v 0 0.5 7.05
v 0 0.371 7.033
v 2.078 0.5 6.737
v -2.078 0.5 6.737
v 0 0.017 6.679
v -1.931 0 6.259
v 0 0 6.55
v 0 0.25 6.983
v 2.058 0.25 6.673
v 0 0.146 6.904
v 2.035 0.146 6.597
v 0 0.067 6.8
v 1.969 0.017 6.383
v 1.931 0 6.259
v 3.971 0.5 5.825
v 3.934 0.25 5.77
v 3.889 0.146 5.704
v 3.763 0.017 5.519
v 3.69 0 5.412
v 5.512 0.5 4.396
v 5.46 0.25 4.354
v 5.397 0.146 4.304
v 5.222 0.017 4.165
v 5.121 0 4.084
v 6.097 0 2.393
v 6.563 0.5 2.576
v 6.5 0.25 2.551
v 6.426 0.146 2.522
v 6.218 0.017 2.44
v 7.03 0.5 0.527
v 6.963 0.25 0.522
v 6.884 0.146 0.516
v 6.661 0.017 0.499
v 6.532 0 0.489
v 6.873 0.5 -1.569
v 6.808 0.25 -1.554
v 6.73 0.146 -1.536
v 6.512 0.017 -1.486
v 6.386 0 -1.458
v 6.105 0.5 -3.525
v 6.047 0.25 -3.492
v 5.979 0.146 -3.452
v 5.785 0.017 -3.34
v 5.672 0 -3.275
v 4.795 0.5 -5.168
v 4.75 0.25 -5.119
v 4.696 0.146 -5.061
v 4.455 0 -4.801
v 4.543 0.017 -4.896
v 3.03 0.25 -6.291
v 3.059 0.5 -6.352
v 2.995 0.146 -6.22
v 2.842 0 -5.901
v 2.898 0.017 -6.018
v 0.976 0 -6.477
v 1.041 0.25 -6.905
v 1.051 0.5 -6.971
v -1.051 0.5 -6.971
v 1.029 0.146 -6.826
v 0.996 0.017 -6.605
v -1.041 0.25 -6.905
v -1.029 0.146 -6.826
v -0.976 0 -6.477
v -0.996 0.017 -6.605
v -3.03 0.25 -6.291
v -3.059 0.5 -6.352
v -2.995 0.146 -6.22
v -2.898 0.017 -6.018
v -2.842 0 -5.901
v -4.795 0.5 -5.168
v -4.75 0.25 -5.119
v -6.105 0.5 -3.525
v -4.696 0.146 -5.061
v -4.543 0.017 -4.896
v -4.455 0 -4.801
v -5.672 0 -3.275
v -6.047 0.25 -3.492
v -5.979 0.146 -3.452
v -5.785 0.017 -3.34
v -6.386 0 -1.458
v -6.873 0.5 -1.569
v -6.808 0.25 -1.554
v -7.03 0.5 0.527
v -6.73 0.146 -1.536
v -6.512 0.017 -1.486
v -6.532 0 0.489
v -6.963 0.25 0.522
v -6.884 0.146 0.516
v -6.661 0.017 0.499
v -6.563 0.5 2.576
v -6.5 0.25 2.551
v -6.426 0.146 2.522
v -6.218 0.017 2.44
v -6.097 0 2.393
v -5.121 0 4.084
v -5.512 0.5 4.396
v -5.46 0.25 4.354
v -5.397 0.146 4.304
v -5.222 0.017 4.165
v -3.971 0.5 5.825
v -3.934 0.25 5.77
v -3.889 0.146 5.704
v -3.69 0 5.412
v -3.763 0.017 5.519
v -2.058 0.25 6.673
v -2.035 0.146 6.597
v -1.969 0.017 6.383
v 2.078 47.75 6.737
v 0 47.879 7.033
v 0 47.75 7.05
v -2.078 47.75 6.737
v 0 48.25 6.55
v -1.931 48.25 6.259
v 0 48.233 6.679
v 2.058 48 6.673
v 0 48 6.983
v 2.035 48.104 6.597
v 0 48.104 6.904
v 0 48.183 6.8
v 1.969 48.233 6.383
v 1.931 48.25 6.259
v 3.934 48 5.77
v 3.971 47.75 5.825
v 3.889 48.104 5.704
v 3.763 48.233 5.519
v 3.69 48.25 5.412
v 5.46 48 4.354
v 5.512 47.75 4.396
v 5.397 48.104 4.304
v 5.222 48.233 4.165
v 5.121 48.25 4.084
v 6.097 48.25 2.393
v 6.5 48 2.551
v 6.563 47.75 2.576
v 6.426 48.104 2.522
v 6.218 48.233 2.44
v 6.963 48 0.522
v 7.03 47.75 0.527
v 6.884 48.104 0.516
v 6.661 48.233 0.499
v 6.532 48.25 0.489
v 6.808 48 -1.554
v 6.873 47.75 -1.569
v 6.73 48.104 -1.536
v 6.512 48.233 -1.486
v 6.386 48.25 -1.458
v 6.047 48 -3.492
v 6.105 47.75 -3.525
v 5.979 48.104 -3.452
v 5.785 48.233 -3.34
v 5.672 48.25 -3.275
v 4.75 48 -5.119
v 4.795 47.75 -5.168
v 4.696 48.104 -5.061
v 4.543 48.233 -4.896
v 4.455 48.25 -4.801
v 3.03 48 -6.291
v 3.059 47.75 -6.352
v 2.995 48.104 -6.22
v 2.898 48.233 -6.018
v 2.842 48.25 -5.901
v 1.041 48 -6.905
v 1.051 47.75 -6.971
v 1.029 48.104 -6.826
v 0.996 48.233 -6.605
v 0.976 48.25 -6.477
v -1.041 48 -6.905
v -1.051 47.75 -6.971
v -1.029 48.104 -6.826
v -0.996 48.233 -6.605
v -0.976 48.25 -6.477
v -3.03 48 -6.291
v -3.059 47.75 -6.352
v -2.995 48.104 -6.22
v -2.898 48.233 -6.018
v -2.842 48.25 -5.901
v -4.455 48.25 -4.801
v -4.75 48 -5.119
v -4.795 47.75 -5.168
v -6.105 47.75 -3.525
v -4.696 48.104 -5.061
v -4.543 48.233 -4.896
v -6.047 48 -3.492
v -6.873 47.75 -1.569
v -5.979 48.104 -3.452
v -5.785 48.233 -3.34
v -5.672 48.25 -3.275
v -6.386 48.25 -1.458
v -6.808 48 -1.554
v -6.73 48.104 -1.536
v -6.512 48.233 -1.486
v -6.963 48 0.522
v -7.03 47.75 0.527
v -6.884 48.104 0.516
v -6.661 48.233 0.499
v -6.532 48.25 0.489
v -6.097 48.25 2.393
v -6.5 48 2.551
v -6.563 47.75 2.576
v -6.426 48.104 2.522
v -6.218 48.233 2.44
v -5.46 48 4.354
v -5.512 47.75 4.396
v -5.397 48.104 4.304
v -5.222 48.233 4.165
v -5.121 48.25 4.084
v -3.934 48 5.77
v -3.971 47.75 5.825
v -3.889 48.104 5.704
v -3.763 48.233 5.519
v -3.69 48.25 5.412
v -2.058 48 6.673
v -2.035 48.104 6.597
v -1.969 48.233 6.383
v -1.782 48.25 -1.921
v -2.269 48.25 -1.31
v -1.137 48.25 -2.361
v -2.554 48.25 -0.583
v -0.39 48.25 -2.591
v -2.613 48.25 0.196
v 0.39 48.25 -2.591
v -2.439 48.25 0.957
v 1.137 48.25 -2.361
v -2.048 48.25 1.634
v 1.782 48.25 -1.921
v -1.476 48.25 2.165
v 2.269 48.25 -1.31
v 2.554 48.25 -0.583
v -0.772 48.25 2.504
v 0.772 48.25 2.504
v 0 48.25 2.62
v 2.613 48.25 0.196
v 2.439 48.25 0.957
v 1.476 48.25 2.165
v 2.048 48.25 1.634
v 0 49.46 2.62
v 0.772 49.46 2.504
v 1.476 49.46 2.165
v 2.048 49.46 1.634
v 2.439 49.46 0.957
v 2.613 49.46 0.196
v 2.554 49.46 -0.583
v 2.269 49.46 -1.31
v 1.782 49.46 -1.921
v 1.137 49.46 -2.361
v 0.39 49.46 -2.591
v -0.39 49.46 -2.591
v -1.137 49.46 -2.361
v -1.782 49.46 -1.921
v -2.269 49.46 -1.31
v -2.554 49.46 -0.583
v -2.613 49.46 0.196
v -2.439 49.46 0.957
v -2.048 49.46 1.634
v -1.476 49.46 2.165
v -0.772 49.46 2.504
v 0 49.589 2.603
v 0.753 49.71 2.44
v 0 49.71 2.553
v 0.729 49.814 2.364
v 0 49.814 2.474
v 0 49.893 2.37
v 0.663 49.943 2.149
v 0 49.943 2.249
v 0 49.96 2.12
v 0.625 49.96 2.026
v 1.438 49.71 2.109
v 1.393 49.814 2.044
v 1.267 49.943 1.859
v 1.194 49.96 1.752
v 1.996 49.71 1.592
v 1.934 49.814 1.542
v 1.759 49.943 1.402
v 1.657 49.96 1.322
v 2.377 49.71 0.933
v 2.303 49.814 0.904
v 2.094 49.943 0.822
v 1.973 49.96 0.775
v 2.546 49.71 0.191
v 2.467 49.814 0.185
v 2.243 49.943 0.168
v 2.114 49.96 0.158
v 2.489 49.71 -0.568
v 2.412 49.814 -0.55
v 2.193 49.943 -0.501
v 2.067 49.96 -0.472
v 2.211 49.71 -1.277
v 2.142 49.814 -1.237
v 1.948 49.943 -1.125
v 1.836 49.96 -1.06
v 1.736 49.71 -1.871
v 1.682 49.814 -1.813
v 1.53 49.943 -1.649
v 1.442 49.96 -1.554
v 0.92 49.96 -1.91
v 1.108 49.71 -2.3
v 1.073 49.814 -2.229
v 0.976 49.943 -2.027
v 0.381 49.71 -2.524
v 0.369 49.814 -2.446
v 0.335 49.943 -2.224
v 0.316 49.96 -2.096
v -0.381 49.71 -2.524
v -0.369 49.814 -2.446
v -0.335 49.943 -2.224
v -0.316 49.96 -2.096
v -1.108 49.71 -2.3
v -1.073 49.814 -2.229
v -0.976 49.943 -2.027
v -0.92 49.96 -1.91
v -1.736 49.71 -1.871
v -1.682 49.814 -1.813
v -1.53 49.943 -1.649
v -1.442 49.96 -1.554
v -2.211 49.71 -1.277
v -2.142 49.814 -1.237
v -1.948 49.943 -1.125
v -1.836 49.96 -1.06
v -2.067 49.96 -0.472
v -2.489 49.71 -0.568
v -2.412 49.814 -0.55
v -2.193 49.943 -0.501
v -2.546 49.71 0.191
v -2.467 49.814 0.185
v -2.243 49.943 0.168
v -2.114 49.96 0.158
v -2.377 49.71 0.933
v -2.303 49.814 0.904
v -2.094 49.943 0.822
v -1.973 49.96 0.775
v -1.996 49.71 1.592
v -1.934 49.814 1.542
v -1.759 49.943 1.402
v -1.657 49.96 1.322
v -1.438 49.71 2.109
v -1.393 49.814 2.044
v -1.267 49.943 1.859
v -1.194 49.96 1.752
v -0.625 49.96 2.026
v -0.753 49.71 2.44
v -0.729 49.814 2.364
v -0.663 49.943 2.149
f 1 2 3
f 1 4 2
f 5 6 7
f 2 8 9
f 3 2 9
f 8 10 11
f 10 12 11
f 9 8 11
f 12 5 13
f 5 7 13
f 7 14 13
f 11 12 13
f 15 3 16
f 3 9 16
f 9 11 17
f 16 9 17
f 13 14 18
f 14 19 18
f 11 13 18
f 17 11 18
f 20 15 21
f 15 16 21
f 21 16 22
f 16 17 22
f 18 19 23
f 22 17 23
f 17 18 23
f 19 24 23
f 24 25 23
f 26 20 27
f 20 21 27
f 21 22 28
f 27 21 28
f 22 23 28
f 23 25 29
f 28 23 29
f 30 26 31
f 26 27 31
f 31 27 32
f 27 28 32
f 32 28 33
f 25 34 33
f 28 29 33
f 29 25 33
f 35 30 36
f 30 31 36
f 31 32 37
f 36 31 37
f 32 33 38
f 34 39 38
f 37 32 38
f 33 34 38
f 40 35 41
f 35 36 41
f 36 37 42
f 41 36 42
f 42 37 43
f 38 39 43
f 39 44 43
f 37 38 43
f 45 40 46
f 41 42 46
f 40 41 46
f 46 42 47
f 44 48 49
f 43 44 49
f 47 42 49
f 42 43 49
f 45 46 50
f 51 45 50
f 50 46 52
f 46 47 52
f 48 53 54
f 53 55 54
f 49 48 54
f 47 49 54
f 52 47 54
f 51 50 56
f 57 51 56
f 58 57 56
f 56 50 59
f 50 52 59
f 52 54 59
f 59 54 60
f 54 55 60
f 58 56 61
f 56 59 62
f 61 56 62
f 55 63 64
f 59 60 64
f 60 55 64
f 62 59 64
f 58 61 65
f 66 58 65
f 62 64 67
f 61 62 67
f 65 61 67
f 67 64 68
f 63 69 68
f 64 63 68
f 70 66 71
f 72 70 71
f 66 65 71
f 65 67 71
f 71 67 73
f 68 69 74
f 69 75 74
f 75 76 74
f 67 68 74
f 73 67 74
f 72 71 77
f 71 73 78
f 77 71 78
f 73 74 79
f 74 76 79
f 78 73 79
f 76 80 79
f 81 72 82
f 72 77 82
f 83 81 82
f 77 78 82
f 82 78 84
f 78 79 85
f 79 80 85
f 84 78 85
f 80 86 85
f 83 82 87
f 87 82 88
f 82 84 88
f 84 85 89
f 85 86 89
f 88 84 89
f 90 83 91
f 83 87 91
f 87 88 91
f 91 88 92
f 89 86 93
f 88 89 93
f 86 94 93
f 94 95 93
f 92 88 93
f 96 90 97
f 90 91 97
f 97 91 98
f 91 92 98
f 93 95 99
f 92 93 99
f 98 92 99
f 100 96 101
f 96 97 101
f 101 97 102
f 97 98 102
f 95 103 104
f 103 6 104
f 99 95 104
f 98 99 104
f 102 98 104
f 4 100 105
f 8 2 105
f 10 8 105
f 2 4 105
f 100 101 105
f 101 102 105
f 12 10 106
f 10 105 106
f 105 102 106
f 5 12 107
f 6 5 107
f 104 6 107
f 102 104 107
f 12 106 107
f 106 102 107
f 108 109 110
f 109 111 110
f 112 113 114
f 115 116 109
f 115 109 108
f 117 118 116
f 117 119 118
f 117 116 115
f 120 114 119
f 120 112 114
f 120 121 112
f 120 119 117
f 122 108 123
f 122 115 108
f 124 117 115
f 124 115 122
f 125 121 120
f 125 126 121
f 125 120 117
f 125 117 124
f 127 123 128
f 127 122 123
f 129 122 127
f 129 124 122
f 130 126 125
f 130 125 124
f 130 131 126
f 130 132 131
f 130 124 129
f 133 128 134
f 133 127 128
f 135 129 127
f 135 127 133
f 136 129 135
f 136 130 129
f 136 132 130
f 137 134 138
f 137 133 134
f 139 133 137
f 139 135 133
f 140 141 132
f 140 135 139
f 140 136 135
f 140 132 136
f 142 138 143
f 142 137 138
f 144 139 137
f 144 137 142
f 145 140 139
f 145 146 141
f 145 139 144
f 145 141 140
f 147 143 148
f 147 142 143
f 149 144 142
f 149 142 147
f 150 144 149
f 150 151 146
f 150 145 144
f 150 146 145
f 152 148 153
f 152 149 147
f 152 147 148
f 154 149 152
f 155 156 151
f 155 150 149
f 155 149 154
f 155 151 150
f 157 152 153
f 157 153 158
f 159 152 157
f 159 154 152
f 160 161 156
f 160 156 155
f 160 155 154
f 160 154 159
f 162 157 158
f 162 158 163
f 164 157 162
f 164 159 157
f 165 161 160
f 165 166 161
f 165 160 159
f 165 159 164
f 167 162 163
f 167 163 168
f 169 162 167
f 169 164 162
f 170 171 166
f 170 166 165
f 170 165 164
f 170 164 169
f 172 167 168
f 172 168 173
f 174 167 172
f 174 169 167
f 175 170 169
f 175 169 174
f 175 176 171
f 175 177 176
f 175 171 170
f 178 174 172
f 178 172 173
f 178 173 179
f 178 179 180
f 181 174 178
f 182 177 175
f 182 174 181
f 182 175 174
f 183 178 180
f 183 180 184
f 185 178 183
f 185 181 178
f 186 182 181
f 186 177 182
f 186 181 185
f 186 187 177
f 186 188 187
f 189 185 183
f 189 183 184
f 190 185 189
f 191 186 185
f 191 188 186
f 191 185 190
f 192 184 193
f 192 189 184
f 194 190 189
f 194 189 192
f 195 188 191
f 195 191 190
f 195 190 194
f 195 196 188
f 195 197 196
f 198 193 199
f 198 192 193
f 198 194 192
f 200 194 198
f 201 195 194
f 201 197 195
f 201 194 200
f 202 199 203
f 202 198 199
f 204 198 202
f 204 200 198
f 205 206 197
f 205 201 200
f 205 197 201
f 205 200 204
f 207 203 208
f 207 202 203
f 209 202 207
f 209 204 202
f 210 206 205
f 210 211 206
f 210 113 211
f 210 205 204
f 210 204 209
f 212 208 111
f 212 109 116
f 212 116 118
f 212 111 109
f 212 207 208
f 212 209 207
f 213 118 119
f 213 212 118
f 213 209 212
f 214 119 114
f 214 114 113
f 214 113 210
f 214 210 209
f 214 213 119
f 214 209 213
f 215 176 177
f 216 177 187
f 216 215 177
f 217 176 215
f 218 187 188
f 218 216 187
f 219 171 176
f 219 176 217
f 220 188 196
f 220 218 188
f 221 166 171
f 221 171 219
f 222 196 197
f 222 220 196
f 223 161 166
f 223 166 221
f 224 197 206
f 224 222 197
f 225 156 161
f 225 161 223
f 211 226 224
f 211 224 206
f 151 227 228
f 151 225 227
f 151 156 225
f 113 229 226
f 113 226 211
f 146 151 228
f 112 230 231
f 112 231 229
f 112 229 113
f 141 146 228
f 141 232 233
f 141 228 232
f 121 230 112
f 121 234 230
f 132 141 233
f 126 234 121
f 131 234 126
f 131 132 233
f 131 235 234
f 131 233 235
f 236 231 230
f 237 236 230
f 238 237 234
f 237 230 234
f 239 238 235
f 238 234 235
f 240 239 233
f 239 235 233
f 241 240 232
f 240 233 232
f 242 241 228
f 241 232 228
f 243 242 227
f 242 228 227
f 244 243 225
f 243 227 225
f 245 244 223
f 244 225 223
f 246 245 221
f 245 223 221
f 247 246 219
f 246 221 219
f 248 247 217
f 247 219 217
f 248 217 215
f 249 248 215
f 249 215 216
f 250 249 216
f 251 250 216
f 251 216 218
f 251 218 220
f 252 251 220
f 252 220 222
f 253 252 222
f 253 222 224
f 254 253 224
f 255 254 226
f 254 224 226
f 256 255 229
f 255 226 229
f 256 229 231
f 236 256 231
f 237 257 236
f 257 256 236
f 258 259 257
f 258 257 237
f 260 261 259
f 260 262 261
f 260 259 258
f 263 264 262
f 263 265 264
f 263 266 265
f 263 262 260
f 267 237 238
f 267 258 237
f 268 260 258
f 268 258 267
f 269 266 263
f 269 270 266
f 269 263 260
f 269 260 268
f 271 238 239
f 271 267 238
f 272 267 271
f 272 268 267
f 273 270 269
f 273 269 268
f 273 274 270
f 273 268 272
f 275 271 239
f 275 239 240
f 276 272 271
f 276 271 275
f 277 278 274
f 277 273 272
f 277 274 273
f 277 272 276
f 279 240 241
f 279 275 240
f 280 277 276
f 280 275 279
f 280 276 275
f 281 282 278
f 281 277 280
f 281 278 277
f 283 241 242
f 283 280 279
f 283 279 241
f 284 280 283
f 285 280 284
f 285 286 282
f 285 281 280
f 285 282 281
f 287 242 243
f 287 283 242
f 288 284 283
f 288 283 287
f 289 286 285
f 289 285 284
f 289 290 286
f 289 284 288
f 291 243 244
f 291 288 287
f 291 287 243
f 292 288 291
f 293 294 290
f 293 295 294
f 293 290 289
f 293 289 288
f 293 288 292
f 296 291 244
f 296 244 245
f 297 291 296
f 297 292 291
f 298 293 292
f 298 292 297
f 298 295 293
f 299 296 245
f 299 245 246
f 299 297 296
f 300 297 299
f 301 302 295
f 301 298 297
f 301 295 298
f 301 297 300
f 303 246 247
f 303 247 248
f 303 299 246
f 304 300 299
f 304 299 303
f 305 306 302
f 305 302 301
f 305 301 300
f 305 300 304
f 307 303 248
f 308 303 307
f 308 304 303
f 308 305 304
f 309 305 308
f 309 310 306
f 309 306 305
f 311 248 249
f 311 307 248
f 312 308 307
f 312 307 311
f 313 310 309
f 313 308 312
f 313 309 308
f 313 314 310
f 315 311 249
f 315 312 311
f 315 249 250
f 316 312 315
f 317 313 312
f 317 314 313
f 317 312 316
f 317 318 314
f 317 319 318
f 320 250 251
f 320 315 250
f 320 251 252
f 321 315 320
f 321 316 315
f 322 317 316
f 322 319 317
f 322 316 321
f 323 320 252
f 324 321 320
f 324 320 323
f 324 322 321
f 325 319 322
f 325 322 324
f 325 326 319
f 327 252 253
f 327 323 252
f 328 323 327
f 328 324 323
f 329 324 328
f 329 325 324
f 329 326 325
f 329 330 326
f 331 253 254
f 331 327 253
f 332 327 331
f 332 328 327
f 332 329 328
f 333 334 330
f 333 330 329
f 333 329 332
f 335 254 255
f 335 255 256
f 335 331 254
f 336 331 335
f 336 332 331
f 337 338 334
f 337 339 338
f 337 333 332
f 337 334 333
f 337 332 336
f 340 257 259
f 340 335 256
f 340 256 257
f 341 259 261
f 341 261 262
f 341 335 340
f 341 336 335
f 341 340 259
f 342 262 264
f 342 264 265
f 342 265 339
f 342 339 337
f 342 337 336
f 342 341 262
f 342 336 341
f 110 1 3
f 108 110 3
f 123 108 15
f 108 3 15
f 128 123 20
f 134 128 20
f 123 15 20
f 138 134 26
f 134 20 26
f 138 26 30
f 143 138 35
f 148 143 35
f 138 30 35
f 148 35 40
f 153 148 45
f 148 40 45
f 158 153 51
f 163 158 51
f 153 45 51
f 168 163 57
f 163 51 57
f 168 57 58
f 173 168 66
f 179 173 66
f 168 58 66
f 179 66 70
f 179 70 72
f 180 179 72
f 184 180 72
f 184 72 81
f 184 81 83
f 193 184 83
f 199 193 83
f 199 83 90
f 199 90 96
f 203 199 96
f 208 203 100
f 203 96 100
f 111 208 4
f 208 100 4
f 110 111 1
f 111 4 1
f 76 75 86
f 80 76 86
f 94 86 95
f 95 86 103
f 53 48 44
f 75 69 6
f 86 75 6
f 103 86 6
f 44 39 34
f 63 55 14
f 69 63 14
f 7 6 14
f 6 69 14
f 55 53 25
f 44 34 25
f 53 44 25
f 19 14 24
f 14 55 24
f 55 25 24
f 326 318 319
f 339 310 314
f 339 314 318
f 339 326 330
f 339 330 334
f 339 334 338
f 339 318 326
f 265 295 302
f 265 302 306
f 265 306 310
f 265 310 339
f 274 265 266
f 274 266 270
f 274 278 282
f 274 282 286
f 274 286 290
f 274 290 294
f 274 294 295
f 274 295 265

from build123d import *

# Parameters (mm, degrees)
SKETCH1_R           = 7.05
BOSS_EXTRUDE2_DEPTH = 48.25
SKETCH2_R           = 2.62
BOSS_EXTRUDE3_DEPTH = 1.71
FILLET1_R           = 0.5


with BuildPart() as part:
    # Sketch1 → Boss-Extrude2 (new body)
    with BuildSketch(Plane(origin=(0, 0, 0), x_dir=(1, 0, 0), z_dir=(0, 1, 0))):
        with Locations(Location((0, 0, 0), (0, 0, 270))):
            Circle(SKETCH1_R)
    extrude(amount=BOSS_EXTRUDE2_DEPTH)

    # Sketch2 → Boss-Extrude3 (add)
    with BuildSketch(Plane(origin=(0, 48.25, 0), x_dir=(1, 0, 0), z_dir=(0, 1, 0))):
        with Locations(Location((0, 0, 0), (0, 0, 270))):
            Circle(SKETCH2_R)
    extrude(amount=BOSS_EXTRUDE3_DEPTH)

    # Fillet1
    fillet1_edges = [part.edges().sort_by_distance(p)[0] for p in [
        (0, 0, -7.05),
        (0, 48.25, -7.05),
        (0, 49.96, -2.62),
    ]]
    fillet(fillet1_edges, radius=FILLET1_R)


solid = part.part
